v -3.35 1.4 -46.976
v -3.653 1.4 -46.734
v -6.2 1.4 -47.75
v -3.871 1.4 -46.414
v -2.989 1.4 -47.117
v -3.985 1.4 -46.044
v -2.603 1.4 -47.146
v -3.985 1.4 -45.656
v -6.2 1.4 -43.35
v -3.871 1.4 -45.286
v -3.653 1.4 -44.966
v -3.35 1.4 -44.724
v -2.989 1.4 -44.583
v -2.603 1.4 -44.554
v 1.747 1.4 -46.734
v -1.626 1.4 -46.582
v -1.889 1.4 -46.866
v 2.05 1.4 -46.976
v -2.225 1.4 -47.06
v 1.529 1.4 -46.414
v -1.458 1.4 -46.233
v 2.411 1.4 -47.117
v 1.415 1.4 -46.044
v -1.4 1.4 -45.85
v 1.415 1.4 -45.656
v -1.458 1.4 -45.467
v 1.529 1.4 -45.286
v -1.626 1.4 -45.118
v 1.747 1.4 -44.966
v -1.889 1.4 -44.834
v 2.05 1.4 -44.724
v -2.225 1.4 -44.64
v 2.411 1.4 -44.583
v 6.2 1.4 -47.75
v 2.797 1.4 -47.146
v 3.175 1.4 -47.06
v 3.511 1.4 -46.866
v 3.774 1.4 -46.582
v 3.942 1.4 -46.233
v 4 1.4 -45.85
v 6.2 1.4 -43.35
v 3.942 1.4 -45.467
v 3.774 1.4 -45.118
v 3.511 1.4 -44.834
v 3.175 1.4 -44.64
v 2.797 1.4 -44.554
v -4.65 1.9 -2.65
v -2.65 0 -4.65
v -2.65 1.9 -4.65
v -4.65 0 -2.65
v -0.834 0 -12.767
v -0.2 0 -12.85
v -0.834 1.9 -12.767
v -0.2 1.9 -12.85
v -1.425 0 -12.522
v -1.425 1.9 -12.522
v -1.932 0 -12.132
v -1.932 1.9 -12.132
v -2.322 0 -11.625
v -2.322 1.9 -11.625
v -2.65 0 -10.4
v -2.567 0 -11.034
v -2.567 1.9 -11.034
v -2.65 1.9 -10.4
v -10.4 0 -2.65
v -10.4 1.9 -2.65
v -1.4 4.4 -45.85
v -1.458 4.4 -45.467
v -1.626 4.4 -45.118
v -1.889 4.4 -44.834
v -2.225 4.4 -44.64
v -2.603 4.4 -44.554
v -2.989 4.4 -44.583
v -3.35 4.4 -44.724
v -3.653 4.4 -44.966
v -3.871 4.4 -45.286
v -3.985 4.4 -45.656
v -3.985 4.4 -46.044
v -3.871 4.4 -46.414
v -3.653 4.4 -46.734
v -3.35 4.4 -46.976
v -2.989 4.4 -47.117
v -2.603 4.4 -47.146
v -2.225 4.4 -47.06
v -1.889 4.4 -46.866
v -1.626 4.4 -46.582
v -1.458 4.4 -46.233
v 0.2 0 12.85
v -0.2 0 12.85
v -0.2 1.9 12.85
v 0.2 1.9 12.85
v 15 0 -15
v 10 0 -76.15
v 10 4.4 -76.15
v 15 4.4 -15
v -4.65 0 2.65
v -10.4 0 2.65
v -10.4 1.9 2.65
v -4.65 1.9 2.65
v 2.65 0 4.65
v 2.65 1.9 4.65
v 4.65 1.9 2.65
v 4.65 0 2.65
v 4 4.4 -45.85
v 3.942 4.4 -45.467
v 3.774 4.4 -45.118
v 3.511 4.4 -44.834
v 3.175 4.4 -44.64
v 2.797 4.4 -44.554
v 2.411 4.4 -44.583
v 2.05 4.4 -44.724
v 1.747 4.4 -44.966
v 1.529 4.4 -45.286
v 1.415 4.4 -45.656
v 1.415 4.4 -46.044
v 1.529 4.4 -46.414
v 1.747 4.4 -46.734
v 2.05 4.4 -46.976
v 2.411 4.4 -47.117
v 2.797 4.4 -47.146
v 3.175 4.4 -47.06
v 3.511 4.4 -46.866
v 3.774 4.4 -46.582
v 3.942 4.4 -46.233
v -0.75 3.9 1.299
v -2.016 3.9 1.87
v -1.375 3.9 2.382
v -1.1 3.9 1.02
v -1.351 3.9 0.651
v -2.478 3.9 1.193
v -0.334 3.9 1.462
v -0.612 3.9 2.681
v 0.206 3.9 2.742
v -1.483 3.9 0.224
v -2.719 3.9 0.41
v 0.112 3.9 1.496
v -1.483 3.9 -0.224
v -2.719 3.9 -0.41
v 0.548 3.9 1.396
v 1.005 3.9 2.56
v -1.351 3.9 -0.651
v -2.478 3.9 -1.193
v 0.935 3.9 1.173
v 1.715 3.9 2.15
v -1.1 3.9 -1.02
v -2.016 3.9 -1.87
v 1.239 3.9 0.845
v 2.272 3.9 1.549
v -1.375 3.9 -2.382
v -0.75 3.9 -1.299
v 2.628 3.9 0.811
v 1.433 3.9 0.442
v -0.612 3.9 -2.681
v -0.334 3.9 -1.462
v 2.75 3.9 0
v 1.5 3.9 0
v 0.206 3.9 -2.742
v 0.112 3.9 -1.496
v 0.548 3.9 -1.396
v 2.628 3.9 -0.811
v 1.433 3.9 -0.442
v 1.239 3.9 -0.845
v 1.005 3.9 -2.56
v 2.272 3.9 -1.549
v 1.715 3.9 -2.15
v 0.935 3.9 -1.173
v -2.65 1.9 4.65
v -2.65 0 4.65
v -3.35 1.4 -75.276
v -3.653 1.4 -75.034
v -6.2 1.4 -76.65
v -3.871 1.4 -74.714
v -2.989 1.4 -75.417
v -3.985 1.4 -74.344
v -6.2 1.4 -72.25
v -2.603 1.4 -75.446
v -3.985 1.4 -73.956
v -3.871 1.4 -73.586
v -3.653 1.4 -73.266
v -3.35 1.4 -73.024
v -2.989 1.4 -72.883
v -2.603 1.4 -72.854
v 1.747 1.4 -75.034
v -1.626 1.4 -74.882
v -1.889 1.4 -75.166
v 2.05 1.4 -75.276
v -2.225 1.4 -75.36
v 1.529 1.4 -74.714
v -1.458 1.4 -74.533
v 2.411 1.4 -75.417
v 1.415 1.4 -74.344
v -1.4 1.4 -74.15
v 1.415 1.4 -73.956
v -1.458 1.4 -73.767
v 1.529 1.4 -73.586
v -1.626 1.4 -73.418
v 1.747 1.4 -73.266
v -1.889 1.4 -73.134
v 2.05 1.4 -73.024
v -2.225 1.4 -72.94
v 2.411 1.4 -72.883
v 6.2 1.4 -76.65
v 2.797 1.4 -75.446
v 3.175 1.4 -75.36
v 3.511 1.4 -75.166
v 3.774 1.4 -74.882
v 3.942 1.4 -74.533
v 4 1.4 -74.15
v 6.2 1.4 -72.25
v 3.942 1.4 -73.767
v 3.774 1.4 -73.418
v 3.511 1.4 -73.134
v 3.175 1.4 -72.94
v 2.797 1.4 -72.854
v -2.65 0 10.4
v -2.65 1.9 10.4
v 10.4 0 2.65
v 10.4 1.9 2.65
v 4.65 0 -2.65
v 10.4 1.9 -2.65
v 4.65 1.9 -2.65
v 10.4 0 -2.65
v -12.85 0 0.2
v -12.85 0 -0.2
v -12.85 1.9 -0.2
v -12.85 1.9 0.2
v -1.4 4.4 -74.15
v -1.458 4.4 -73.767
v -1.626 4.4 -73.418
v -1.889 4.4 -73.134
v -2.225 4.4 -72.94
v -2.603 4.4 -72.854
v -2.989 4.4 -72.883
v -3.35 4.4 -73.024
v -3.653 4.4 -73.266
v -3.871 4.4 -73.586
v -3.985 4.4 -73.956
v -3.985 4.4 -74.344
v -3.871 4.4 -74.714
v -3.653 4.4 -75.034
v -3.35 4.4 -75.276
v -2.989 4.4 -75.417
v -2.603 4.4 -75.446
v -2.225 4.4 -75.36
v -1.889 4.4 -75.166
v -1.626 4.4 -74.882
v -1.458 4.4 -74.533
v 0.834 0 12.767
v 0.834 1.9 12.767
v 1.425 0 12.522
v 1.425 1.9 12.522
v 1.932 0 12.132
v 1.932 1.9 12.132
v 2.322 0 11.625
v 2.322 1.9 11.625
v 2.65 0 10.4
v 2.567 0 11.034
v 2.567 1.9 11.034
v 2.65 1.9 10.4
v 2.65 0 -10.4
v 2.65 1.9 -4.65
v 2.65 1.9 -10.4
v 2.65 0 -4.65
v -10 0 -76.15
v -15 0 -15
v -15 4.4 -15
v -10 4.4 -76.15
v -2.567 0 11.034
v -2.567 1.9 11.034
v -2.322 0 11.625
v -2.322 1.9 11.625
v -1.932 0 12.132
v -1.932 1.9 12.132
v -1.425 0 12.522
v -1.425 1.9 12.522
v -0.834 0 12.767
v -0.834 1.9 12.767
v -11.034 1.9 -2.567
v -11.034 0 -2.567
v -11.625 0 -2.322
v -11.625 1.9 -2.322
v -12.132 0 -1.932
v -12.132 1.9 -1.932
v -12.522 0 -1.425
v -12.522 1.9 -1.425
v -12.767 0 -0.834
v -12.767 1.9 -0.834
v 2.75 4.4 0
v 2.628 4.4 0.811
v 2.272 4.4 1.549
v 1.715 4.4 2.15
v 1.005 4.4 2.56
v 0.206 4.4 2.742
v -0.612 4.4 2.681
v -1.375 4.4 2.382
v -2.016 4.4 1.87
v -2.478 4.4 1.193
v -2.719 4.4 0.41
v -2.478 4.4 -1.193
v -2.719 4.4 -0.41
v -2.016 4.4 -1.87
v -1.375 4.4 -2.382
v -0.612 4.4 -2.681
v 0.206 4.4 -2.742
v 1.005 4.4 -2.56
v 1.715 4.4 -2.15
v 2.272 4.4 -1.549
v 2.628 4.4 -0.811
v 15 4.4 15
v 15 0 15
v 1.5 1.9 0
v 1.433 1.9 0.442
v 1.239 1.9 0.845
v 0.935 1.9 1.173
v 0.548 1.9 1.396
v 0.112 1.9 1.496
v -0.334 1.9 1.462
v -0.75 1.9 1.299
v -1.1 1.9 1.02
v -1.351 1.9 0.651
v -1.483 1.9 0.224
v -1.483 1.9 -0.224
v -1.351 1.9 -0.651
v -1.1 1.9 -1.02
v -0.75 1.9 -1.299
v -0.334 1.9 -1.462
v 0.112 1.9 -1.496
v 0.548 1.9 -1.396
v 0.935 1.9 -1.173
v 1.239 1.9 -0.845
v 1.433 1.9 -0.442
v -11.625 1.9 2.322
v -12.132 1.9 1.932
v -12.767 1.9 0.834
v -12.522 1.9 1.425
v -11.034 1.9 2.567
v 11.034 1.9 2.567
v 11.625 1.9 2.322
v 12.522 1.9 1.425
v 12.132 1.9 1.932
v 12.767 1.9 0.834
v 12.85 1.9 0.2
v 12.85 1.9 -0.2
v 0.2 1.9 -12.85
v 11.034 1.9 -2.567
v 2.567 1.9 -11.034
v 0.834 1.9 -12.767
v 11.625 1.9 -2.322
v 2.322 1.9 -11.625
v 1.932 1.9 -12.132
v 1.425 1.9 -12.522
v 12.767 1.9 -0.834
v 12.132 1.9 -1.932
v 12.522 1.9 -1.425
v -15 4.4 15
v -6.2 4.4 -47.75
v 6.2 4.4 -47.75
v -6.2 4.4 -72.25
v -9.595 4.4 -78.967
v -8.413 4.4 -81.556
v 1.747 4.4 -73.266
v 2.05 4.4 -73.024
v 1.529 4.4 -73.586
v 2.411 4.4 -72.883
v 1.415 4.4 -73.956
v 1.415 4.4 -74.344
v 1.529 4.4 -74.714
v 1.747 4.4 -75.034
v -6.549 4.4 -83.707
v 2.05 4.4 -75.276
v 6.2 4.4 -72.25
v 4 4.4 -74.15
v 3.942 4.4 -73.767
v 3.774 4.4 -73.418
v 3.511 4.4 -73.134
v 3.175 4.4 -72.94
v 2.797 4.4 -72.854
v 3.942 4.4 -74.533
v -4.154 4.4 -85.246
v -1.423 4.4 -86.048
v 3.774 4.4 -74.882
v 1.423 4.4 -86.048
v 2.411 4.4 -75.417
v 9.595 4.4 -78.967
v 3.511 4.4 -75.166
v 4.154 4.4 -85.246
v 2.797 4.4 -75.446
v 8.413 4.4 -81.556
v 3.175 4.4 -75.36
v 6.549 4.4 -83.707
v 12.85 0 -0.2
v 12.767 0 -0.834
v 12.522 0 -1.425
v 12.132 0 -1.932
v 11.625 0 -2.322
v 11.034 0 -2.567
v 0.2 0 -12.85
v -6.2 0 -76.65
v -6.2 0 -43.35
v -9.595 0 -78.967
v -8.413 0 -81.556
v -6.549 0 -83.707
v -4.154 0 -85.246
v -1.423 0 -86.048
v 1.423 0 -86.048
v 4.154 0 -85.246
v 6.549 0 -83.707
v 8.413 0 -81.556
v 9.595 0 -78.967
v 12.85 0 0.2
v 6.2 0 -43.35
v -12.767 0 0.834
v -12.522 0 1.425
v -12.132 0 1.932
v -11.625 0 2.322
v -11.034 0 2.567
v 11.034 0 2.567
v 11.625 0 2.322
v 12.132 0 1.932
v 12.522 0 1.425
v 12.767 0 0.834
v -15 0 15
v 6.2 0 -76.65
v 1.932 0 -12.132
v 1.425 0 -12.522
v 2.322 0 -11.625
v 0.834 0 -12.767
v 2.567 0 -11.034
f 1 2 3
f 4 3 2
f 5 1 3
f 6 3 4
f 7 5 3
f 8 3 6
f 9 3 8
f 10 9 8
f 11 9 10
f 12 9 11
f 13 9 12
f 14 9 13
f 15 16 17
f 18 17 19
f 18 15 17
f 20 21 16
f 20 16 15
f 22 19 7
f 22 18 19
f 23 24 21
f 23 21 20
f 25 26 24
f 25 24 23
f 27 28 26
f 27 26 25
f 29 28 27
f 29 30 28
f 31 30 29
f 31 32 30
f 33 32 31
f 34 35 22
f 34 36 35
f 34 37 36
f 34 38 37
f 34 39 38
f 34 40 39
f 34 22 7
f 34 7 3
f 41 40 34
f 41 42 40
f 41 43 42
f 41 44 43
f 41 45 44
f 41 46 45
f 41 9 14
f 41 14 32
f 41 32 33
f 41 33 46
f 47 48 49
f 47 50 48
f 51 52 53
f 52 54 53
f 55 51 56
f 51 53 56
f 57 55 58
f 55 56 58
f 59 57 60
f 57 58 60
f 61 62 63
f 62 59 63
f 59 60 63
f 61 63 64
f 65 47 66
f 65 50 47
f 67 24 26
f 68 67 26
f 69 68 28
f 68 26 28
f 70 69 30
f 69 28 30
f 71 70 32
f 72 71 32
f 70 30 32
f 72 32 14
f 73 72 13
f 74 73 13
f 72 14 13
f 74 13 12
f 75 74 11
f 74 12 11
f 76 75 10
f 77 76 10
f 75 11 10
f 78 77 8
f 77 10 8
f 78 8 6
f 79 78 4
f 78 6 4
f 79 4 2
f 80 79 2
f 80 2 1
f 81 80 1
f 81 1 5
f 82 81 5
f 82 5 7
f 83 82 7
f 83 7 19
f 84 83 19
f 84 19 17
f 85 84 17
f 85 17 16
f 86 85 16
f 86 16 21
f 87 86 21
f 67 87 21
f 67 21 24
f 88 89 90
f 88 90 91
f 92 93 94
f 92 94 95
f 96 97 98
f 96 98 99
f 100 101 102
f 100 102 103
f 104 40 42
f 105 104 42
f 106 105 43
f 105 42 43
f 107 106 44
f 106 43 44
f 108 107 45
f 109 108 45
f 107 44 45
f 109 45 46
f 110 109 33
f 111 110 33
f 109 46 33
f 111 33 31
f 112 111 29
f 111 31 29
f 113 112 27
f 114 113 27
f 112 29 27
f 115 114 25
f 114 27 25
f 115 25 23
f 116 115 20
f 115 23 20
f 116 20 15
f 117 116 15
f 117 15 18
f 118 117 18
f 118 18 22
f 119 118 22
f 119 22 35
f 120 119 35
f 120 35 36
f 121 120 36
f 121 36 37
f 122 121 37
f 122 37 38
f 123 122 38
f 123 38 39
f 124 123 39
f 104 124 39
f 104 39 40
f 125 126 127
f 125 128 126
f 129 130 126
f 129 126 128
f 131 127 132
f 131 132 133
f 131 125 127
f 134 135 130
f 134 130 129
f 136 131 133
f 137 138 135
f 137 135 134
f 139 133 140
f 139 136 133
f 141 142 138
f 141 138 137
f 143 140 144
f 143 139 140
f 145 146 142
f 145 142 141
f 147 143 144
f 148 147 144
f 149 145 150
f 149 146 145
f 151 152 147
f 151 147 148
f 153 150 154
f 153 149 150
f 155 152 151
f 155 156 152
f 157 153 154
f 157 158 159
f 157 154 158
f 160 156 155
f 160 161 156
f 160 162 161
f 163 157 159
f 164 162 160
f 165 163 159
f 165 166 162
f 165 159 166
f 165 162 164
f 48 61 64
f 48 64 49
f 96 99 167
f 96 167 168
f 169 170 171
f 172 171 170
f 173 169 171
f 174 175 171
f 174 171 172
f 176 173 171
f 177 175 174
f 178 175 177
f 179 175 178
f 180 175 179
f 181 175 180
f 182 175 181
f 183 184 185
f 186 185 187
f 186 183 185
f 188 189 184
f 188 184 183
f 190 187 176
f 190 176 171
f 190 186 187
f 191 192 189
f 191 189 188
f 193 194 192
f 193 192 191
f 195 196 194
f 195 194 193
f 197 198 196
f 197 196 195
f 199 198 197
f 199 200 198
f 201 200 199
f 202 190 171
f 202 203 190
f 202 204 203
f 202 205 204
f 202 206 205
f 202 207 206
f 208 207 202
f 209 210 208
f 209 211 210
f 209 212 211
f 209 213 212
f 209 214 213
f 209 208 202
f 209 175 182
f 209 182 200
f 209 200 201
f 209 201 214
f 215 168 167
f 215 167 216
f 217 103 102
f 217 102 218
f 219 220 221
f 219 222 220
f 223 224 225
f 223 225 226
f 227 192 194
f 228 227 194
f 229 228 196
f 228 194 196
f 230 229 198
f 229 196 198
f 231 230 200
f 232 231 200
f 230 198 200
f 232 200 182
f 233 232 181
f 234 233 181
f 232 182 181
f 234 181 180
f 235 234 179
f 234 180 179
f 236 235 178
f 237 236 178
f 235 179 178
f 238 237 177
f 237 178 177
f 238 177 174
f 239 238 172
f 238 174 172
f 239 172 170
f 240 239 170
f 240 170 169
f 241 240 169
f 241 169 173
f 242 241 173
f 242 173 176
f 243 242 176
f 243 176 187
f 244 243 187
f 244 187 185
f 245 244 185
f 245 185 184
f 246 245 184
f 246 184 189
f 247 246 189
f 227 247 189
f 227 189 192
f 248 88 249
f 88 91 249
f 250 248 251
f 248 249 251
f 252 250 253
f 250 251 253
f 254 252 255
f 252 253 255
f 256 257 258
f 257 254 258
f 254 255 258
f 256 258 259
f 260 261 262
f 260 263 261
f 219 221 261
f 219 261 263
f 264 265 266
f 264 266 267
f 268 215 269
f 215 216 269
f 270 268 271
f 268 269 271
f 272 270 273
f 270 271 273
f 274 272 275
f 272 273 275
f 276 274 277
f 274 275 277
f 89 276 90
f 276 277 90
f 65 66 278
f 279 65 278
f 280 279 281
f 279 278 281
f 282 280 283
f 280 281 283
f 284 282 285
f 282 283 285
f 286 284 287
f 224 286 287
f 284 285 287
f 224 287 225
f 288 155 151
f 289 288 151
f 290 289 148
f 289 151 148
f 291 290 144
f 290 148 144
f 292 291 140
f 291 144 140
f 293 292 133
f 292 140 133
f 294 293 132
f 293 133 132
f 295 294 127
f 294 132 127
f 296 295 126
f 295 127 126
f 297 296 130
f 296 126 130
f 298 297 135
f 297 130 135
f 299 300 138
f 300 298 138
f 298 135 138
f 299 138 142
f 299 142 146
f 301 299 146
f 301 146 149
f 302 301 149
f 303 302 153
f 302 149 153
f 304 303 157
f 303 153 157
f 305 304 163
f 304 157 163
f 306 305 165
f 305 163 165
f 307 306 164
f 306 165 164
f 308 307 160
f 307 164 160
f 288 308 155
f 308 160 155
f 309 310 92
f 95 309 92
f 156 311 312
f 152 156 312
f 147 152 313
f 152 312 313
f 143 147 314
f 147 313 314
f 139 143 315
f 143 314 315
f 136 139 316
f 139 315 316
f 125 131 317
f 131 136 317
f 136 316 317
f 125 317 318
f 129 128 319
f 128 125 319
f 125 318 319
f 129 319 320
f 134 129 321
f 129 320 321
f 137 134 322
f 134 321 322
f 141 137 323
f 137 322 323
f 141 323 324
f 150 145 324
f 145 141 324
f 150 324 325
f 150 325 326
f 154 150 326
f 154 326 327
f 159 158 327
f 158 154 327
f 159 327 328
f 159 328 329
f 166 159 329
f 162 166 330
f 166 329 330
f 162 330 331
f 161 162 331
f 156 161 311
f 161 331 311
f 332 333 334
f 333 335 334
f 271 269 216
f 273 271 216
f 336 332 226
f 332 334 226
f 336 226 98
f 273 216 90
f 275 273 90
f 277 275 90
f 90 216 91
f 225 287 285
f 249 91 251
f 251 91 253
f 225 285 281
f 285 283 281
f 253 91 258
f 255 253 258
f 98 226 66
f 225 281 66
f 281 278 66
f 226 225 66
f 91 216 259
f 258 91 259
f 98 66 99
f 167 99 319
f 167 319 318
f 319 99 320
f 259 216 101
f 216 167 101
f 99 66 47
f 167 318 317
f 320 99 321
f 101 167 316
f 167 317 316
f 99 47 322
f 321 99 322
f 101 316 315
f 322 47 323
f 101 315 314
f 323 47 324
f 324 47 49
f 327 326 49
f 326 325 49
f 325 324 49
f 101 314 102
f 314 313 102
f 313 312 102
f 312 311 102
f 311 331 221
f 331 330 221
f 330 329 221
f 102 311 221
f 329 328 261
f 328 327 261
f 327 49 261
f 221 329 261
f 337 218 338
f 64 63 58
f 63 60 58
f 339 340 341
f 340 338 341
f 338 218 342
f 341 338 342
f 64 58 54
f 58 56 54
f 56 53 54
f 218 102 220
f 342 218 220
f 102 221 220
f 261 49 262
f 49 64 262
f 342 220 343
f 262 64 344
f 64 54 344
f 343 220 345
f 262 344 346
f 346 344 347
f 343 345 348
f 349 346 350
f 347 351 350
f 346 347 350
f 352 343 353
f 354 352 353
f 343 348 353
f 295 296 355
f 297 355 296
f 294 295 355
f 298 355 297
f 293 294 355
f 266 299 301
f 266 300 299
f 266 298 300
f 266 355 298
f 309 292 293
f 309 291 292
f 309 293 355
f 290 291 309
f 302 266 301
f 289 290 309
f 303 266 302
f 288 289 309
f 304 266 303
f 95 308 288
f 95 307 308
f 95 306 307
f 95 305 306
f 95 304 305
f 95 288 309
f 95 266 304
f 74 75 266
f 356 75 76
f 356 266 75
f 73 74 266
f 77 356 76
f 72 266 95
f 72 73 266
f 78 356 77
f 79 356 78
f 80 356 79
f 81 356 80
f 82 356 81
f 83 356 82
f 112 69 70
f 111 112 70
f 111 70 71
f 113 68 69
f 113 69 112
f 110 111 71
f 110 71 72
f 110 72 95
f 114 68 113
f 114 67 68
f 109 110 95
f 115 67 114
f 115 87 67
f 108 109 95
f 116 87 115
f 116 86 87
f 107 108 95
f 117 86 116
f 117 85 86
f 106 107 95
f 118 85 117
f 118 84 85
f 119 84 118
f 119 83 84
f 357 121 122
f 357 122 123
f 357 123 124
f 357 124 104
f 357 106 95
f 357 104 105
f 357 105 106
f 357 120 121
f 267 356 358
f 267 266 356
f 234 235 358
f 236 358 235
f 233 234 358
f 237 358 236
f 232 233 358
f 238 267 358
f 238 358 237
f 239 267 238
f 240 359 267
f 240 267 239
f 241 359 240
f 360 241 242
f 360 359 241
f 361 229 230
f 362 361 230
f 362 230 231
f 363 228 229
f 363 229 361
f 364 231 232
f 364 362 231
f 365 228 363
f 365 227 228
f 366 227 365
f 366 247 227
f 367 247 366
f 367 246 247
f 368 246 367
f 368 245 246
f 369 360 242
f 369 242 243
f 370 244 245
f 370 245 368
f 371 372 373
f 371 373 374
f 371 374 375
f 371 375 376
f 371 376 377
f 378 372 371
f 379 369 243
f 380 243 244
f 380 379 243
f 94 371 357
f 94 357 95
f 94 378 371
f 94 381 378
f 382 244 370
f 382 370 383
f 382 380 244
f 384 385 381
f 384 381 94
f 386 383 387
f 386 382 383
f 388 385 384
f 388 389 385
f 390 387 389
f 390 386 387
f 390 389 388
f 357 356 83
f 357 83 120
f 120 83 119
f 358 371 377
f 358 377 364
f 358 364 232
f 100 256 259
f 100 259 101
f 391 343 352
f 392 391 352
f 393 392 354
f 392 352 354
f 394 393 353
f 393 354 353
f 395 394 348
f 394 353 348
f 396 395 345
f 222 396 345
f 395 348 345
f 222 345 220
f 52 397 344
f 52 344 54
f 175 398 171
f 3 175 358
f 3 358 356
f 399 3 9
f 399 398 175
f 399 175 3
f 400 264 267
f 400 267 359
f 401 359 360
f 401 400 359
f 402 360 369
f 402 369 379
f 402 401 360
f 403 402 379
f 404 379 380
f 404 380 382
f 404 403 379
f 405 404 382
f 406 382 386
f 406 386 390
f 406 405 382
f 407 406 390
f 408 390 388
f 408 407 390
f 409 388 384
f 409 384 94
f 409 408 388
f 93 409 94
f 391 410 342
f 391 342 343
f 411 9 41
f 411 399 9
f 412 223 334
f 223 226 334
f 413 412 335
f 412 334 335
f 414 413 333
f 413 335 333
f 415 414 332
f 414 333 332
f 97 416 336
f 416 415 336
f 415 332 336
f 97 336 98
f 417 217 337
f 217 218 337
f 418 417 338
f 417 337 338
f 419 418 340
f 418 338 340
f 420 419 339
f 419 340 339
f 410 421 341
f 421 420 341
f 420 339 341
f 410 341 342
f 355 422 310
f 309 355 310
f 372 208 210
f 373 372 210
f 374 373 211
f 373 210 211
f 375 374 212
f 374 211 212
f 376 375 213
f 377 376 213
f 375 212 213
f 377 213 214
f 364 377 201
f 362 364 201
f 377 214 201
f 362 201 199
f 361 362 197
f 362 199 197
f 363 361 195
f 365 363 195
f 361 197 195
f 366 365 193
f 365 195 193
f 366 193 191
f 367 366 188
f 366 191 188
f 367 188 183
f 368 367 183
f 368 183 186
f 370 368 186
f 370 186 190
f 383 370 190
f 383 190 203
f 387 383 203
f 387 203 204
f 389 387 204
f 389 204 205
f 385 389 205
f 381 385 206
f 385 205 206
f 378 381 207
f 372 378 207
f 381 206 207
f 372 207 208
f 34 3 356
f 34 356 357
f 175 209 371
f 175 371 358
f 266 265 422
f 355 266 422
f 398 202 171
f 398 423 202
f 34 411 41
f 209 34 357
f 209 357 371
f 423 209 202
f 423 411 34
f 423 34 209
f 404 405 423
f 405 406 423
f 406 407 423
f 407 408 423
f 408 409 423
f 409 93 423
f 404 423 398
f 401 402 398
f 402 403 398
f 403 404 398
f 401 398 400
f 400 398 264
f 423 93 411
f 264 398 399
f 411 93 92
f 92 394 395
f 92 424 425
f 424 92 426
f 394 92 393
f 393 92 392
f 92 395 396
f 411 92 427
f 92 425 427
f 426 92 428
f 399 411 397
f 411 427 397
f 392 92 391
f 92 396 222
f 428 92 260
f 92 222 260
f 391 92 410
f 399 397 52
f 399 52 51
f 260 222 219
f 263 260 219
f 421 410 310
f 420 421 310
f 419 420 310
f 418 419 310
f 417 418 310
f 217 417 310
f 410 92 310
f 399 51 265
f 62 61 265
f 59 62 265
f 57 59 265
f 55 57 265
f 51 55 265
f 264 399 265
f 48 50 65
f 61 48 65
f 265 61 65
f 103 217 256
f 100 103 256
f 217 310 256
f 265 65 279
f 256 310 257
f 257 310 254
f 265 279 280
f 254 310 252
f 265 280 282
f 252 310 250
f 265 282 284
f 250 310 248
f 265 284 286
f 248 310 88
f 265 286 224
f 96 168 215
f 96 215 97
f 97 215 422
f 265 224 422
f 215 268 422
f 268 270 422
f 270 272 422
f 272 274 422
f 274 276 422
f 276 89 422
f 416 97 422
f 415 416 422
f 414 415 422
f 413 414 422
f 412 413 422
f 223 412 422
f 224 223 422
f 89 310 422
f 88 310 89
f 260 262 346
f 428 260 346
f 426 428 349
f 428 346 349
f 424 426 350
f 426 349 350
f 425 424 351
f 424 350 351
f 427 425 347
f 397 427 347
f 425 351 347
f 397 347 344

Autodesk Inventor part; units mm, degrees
ref_plane "YZ Plane" through (0, 0, 0) normal (1, 0, 0) x (0, 1, 0)
ref_plane "XZ Plane" through (0, 0, 0) normal (0, 1, 0) x (-1, 0, 0)
ref_plane "XY Plane" through (0, 0, 0) normal (0, 0, 1) x (1, 0, 0)
sketch "Sketch1" plane through (0, 0, 0) normal (0, 1, 0) x (-1, 0, 0)
  line L0 (-15, -15) -> (15, -15)
  line L1 (15, -15) -> (15, 15)
  line L2 (15, 15) -> (-15, 15)
  line L3 (-15, 15) -> (-15, -15)
  line L4 (-15, -15) -> (15, 15) construction
  line L5 (15, -15) -> (-15, 15) construction
  line L6 (-2.45, -12.65) -> (2.45, -12.65) construction
  line L7 (2.45, -12.65) -> (2.45, 12.65) construction
  line L8 (2.45, 12.65) -> (-2.45, 12.65) construction
  line L9 (-2.45, 12.65) -> (-2.45, -12.65) construction
  line L10 (-2.45, -12.65) -> (2.45, 12.65) construction
  line L11 (2.45, -12.65) -> (-2.45, 12.65) construction
  line L12 (-12.65, -2.45) -> (12.65, -2.45) construction
  line L13 (12.65, -2.45) -> (12.65, 2.45) construction
  line L14 (12.65, 2.45) -> (-12.65, 2.45) construction
  line L15 (-12.65, 2.45) -> (-12.65, -2.45) construction
  line L16 (-12.65, -2.45) -> (12.65, 2.45) construction
  line L17 (12.65, -2.45) -> (-12.65, 2.45) construction
  line L18 (-12.85, -2.65) -> (12.85, -2.65)
  line L19 (12.85, -2.65) -> (12.85, 2.65)
  line L20 (12.85, 2.65) -> (-12.85, 2.65)
  line L21 (-12.85, 2.65) -> (-12.85, -2.65)
  line L22 (-12.85, -2.65) -> (12.85, 2.65) construction
  line L23 (12.85, -2.65) -> (-12.85, 2.65) construction
  line L24 (-2.65, -12.85) -> (2.65, -12.85)
  line L25 (2.65, -12.85) -> (2.65, 12.85)
  line L26 (2.65, 12.85) -> (-2.65, 12.85)
  line L27 (-2.65, 12.85) -> (-2.65, -12.85)
  line L28 (-2.65, -12.85) -> (2.65, 12.85) construction
  line L29 (2.65, -12.85) -> (-2.65, 12.85) construction
  point P0 (0, 0)
  point P1 (0, 0)
  dimension "d0" = 30
  dimension "d1" = 4.9
  dimension "d2" = 10.2
  dimension "d3" = 0.2
  dimension "d4" = 0.2
extrude "Extrusion1" add sketch "Sketch1" along normal blind 1.9
sketch "Sketch2" plane through (0, 1.9, 0) normal (0, 1, 0) x (1, 0, 0)
  line L0 (15, 15) -> (-15, 15) projected
  line L1 (-15, 15) -> (-15, -15) projected
  line L2 (-15, -15) -> (15, -15) projected
  line L3 (15, -15) -> (15, 15) projected
  circle A0 centre (0, 0) radius 1.5
  dimension "d7" = 3
extrude "Extrusion2" add sketch "Sketch2" along normal blind 2
sketch "Sketch3" plane through (0, 3.9, 0) normal (0, 1, 0) x (1, 0, 0)
  circle A0 centre (0, 0) radius 1.5 projected
  line L0 (15, 15) -> (-15, 15) projected
  line L1 (-15, 15) -> (-15, -15) projected
  line L2 (-15, -15) -> (15, -15) projected
  line L3 (15, -15) -> (15, 15) projected
  circle A1 centre (0, 0) radius 2.75
  dimension "d10" = 5.5
extrude "Extrusion3" add sketch "Sketch3" along normal blind 0.5 contours L3 L2 L1 L0
chamfer "Chamfer1" distance 2 angle 45 1 edges at (-2.65, 0.95, -2.65)
fillet "Fillet1" radius 2.45 1 edges at (-12.85, 0.95, -2.65)
fillet "Fillet2" radius 2.45 1 edges at (-2.65, 0.95, -12.85)
chamfer "Chamfer2" distance 2 angle 45 1 edges at (2.65, 0.95, -2.65)
chamfer "Chamfer3" distance 2 angle 45 1 edges at (2.65, 0.95, 2.65)
fillet "Fillet3" radius 2.45 1 edges at (12.85, 0.95, -2.65)
fillet "Fillet4" radius 2.45 1 edges at (2.65, 0.95, -12.85)
fillet "Fillet5" radius 2.45 1 edges at (12.85, 0.95, 2.65)
fillet "Fillet6" radius 2.45 1 edges at (2.65, 0.95, 12.85)
chamfer "Chamfer4" distance 2 angle 45 1 edges at (-2.65, 0.95, 2.65)
fillet "Fillet7" radius 2.45 2 edges at (-2.65, 0.95, 12.85) (-12.85, 0.95, 2.65)
sketch "Sketch4" plane through (0, 0, 0) normal (0, -1, 0) x (1, 0, 0)
  line L0 (15, -15) -> (-15, -15) projected
  line L1 (-10.4, 2.65) -> (-4.65, 2.65) projected
  line L2 (-15, -15) -> (-10, -76.15)
  line L3 (-10, -76.15) -> (10, -76.15)
  line L4 (10, -76.15) -> (15, -15)
  line L5 (0, 0) -> (0, -92.3376) construction
  arc A0 (-10, -76.15) -> (10, -76.15) centre (0, -76.15) ccw
  dimension "d32" = 76.15
  dimension "d33" = 20
extrude "Extrusion4" add sketch "Sketch4" against normal up to surface (4.4 mm away)
sketch "Sketch5" plane through (0, 0, 0) normal (0, -1, 0) x (1, 0, 0)
  line L0 (-5.7, -48.25) -> (5.7, -48.25) construction
  line L1 (5.7, -48.25) -> (5.7, -71.75) construction
  line L2 (5.7, -71.75) -> (-5.7, -71.75) construction
  line L3 (-5.7, -71.75) -> (-5.7, -48.25) construction
  line L4 (0, 0) -> (0, -72.1654) construction
  line L5 (-5.7, -48.25) -> (-5.7, -43.85) construction
  line L6 (-5.7, -43.85) -> (5.7, -43.85) construction
  line L7 (5.7, -43.85) -> (5.7, -48.25) construction
  line L8 (5.7, -71.75) -> (5.7, -76.15) construction
  line L9 (5.7, -76.15) -> (-5.7, -76.15) construction
  line L10 (-5.7, -76.15) -> (-5.7, -71.75) construction
  circle A0 centre (-2.7, -45.85) radius 1.3
  circle A1 centre (2.7, -45.85) radius 1.3
  line L11 (-17.4512, -60) -> (18.2205, -60) construction
  circle A2 centre (-2.7, -74.15) radius 1.3
  circle A3 centre (2.7, -74.15) radius 1.3
  line L12 (-6.2, -47.75) -> (6.2, -47.75)
  line L13 (6.2, -47.75) -> (6.2, -72.25)
  line L14 (6.2, -72.25) -> (-6.2, -72.25)
  line L15 (-6.2, -72.25) -> (-6.2, -47.75)
  dimension "d36" = 11.4
  dimension "d37" = 23.5
  dimension "d38" = 3
  dimension "d39" = 2.4
  dimension "d40" = 4.4
  dimension "d41" = 0.5
  dimension "d42" = 0.5
  dimension "d43" = 60
  dimension "d44" = 2.6
extrude "Extrusion5" cut sketch "Sketch5" against normal through all
sketch "Sketch6" plane through (0, 0, 0) normal (0, -1, 0) x (1, 0, 0)
  arc A0 (-10, -76.15) -> (10, -76.15) centre (0, -76.15) ccw projected
  line L0 (-5.7, -48.25) -> (5.7, -48.25) construction
  line L1 (5.7, -48.25) -> (5.7, -71.75) construction
  line L2 (5.7, -71.75) -> (-5.7, -71.75) construction
  line L3 (-5.7, -71.75) -> (-5.7, -48.25) construction
  line L4 (0, 0) -> (0, -72.5327) construction
  line L5 (-5.7, -48.25) -> (-5.7, -43.85) construction
  line L6 (-5.7, -43.85) -> (5.7, -43.85) construction
  line L7 (5.7, -43.85) -> (5.7, -48.25) construction
  line L8 (5.7, -71.75) -> (5.7, -76.15) construction
  line L9 (5.7, -76.15) -> (-5.7, -76.15) construction
  line L10 (-5.7, -76.15) -> (-5.7, -71.75) construction
  line L11 (-0.5684, -60) -> (35.1033, -60) construction
  line L12 (-6.2, -43.35) -> (6.2, -43.35)
  line L13 (6.2, -43.35) -> (6.2, -76.65)
  line L14 (6.2, -76.65) -> (-6.2, -76.65)
  line L15 (-6.2, -76.65) -> (-6.2, -43.35)
  dimension "d64" = 11.4
  dimension "d65" = 23.5
  dimension "d68" = 4.4
  dimension "d70" = 0.5
  dimension "d71" = 60
  dimension "d81" = 0.5
extrude "Extrusion6" cut sketch "Sketch6" against normal blind 1.4
equation "\"d0\" = FrontUpperLegShoulderWidth"
equation "\"d1\" = ServoArmWidth"
equation "\"d2\" = ServoArmLength"
equation "\"d3\" = ServoArmSpacing"
equation "\"d4\" = ServoArmSpacing"
equation "\"d5\" = ServoArmThickness"
equation "\"d7\" = ServoArmHoleRequired"
equation "\"d8\" = MinimalThickness"
equation "\"d10\" = ServoArmHeadScrewTrace"
equation "\"d11\" = ServoArmHeadScrewThickness"
equation "\"d13\" = ServoArmInternFillet"
equation "\"d16\" = ServoArmExternFillet"
equation "\"d17\" = ServoArmExternFillet"
equation "\"d18\" = ServoArmInternFillet"
equation "\"d21\" = ServoArmInternFillet"
equation "\"d24\" = ServoArmExternFillet"
equation "\"d25\" = ServoArmExternFillet"
equation "\"d26\" = ServoArmExternFillet"
equation "\"d27\" = ServoArmExternFillet"
equation "\"d28\" = ServoArmInternFillet"
equation "\"d31\" = ServoArmExternFillet"
equation "\"d32\" = 0.5 * ServoCoreLength + FrontUpperLegLength + ServoFixationLength"
equation "\"d33\" = FrontUpperLegKneeWidth"
equation "\"d36\" = ServoCoreWidth"
equation "\"d37\" = ServoCoreLength"
equation "\"d38\" = ServoEdgeToFixation"
equation "\"d39\" = ServoCoreToFixation"
equation "\"d40\" = ServoFixationLength"
equation "\"d41\" = ServoTraceSpacing"
equation "\"d42\" = ServoTraceSpacing"
equation "\"d43\" = FrontUpperLegLength"
equation "\"d44\" = ServoScrewDiameterRequired"
equation "\"d64\" = ServoCoreWidth"
equation "\"d65\" = ServoCoreLength"
equation "\"d68\" = ServoFixationLength"
equation "\"d70\" = ServoTraceSpacing"
equation "\"d71\" = FrontUpperLegLength"
equation "\"d81\" = ServoTraceSpacing"
equation "\"d92\" = ServoArmThickness + ServoArmHeadScrewThickness + MinimalThickness - LegServoThickness"
equation "\"FrontUpperLegLength\" = 60"
equation "\"FrontUpperLegKneeWidth\" = 20"
equation "\"ServoTraceSpacing\" = 0.5"
equation "\"FrontUpperLegShoulderWidth\" = 30"
equation "\"LegServoThickness\" = 3"
equation "\"ServoArmWidth\" = 4.9"
equation "\"ServoArmLength\" = 10.2"
equation "\"ServoArmSpacing\" = 0.2"
equation "\"ServoArmThickness\" = 1.9"
equation "\"ServoArmHoleRequired\" = 3"
equation "\"MinimalThickness\" = 2"
equation "\"ServoArmHeadScrewTrace\" = 5.5"
equation "\"ServoArmHeadScrewThickness\" = 0.5"
equation "\"ServoArmInternFillet\" = 2"
equation "\"ServoArmExternFillet\" = 2.45"
equation "\"ServoCoreLength\" = 23.5"
equation "\"ServoFixationLength\" = 4.4"
equation "\"ServoCoreWidth\" = 11.4"
equation "\"ServoEdgeToFixation\" = 3"
equation "\"ServoCoreToFixation\" = 2.4"
equation "\"ServoScrewDiameterRequired\" = 2.6"
properties part number "BackUpperLeg"
